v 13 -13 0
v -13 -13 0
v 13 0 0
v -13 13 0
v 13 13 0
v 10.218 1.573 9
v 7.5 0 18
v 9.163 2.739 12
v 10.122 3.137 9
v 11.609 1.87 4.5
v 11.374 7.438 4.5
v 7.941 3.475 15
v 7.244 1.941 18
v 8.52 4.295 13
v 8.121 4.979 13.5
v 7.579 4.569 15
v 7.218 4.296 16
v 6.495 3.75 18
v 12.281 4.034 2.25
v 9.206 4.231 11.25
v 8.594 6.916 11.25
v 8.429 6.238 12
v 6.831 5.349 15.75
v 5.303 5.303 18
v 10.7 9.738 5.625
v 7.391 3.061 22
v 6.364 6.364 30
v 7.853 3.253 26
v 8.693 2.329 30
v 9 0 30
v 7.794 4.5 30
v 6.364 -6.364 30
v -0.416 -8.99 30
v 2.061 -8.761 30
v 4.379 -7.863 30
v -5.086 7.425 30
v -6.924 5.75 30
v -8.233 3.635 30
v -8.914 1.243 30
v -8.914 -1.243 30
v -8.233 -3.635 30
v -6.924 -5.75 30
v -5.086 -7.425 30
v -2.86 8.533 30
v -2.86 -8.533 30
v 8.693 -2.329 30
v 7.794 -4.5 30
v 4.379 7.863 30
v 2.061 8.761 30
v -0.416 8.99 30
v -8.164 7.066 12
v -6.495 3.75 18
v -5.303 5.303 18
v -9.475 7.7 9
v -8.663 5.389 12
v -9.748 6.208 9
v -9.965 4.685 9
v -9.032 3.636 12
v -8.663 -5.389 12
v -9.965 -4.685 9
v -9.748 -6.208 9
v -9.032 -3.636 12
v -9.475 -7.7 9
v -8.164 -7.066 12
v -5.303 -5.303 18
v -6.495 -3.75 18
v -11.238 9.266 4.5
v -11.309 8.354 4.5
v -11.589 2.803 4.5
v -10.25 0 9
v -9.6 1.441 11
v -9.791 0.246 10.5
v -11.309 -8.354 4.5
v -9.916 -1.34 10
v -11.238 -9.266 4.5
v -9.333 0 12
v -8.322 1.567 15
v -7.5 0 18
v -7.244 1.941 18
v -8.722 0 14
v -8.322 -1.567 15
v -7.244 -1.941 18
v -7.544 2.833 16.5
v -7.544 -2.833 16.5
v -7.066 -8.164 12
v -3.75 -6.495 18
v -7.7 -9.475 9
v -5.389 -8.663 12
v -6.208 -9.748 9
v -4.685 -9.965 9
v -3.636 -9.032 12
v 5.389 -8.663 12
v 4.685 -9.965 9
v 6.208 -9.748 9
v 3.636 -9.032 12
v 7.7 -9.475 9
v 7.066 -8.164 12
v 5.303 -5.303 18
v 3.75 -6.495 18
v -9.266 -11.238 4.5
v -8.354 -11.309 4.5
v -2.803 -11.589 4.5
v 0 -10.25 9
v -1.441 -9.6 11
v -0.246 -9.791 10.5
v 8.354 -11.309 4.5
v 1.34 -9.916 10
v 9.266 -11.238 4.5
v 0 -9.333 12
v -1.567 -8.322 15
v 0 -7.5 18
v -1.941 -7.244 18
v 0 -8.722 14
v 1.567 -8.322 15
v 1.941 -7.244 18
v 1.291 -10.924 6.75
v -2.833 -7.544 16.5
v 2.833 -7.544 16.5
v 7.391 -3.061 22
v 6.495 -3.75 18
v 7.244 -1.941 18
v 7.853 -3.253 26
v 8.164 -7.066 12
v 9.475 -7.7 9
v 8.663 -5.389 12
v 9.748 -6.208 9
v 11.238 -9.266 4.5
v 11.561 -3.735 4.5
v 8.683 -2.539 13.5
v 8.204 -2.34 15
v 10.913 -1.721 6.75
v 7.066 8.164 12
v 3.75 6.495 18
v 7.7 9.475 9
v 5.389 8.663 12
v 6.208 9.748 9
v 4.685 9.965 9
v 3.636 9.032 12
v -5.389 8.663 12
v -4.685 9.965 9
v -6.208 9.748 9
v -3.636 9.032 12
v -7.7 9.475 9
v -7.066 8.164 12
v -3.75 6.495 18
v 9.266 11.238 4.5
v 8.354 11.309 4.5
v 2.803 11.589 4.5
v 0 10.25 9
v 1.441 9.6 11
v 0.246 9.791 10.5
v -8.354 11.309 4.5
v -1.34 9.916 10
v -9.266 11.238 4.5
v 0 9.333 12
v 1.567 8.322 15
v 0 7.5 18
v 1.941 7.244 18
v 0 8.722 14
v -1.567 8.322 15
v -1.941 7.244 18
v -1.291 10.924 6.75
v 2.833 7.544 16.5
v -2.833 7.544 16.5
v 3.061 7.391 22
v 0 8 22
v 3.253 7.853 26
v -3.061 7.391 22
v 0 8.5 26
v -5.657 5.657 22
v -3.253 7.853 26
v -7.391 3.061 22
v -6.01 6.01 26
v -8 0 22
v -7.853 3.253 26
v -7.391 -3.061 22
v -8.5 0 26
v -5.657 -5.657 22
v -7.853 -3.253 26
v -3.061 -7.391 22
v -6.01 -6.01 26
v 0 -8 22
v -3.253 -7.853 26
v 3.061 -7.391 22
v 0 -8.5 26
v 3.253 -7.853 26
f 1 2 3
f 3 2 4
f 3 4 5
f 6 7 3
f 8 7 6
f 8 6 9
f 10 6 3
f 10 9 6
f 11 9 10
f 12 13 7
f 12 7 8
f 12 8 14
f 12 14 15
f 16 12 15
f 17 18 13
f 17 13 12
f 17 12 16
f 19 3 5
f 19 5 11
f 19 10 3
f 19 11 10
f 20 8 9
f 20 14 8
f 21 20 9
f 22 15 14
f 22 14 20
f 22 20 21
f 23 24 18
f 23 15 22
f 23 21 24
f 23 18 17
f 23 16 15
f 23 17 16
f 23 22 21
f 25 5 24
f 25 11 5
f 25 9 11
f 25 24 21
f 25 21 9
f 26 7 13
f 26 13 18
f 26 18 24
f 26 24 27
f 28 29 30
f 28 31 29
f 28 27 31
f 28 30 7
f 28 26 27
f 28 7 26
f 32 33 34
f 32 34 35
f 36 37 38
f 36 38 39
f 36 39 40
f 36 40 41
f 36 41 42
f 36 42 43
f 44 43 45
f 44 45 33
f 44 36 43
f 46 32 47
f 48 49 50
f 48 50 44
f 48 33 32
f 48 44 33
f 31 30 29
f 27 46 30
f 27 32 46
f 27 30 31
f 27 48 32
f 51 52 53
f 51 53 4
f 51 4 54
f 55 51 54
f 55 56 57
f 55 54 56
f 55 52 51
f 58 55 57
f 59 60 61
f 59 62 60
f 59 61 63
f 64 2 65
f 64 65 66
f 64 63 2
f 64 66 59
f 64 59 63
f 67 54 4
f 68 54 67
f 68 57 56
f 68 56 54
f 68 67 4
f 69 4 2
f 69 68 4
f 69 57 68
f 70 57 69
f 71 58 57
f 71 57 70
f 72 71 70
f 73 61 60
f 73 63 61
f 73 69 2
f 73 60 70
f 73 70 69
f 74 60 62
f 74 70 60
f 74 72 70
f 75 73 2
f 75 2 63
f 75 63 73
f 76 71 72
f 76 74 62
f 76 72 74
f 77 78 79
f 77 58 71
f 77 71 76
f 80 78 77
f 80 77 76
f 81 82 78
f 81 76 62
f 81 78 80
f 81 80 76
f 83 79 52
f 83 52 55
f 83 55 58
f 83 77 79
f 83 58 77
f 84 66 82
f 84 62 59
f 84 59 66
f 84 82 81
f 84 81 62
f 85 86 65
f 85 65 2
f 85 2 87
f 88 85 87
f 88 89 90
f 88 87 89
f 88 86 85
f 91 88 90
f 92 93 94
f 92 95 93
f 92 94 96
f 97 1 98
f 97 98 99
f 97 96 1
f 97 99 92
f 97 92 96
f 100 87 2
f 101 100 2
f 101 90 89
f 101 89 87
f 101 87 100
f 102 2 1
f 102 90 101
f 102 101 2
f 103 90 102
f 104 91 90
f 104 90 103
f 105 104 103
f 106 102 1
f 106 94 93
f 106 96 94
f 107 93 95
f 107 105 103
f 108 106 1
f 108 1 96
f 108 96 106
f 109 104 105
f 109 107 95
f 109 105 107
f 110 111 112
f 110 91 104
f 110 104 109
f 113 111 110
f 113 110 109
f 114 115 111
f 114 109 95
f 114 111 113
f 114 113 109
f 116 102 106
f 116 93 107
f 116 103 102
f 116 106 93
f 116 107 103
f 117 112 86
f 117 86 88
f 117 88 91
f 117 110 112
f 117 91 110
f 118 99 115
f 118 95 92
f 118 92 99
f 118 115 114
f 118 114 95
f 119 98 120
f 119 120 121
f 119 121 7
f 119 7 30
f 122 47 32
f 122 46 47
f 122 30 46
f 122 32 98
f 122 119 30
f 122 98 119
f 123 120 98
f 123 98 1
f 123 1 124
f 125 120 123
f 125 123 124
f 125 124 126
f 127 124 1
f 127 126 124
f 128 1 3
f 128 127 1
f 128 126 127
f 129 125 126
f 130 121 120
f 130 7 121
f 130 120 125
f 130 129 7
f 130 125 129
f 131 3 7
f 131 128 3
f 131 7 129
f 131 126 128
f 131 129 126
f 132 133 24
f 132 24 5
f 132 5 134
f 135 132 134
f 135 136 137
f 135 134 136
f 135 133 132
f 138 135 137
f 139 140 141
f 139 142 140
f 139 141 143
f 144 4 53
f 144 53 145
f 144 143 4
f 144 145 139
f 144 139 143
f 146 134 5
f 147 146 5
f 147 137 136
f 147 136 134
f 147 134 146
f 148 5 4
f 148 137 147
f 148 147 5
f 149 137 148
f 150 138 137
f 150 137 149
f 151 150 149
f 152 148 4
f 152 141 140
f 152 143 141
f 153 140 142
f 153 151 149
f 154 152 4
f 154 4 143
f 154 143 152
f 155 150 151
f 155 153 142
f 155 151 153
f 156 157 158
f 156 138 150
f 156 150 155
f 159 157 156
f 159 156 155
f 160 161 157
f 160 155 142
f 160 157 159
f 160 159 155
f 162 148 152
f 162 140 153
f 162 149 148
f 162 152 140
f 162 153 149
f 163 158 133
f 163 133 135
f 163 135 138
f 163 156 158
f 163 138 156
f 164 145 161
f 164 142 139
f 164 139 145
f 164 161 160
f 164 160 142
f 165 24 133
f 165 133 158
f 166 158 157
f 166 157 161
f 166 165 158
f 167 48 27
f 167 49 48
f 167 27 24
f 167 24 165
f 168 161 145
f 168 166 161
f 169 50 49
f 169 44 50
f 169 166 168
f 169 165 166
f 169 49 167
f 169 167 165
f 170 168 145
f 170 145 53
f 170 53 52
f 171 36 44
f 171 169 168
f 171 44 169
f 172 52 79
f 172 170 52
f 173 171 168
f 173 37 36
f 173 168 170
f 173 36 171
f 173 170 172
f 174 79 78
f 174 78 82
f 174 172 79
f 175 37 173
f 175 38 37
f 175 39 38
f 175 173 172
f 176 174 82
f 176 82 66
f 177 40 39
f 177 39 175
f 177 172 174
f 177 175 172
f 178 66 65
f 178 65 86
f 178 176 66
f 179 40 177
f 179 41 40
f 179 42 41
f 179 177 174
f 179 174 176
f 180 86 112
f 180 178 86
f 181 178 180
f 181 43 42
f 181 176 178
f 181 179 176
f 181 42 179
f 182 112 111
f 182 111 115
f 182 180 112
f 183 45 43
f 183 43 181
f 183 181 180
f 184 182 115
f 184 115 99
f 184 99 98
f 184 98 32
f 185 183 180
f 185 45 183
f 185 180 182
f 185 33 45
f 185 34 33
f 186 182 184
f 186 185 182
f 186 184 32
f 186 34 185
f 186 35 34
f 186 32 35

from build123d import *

# Parameters (mm, degrees)
F0_W = 26
F0_H = 26
F3_R = 7.5
F4_R = 9


with BuildPart() as f5:
    # F0 (on Top) → F5 section 0
    with BuildSketch(Plane.XY):
        Rectangle(F0_W, F0_H)
    # F3 (on offset) → F5 section 1
    with BuildSketch(Plane.XY.offset(18)):
        Circle(F3_R)
    loft()

    # F5_face (on face) → F6 section 0
    with BuildSketch(Plane.XY.offset(18)):
        with BuildLine():
            ThreePointArc((5.3033008589, -5.3033008589), (6.9290964938, -2.8701257427), (7.5, 0))
            ThreePointArc((7.5, 0), (6.9290964938, 2.8701257427), (5.3033008589, 5.3033008589))
            ThreePointArc((5.3033008589, 5.3033008589), (0, 7.5), (-5.3033008589, 5.3033008589))
            ThreePointArc((-5.3033008589, 5.3033008589), (-7.5, 0), (-5.3033008589, -5.3033008589))
            ThreePointArc((-5.3033008589, -5.3033008589), (0, -7.5), (5.3033008589, -5.3033008589))
        make_face()
    # F4 (on offset) → F6 section 1
    with BuildSketch(Plane.XY.offset(30)):
        Circle(F4_R)
    loft()


solid = f5.part
